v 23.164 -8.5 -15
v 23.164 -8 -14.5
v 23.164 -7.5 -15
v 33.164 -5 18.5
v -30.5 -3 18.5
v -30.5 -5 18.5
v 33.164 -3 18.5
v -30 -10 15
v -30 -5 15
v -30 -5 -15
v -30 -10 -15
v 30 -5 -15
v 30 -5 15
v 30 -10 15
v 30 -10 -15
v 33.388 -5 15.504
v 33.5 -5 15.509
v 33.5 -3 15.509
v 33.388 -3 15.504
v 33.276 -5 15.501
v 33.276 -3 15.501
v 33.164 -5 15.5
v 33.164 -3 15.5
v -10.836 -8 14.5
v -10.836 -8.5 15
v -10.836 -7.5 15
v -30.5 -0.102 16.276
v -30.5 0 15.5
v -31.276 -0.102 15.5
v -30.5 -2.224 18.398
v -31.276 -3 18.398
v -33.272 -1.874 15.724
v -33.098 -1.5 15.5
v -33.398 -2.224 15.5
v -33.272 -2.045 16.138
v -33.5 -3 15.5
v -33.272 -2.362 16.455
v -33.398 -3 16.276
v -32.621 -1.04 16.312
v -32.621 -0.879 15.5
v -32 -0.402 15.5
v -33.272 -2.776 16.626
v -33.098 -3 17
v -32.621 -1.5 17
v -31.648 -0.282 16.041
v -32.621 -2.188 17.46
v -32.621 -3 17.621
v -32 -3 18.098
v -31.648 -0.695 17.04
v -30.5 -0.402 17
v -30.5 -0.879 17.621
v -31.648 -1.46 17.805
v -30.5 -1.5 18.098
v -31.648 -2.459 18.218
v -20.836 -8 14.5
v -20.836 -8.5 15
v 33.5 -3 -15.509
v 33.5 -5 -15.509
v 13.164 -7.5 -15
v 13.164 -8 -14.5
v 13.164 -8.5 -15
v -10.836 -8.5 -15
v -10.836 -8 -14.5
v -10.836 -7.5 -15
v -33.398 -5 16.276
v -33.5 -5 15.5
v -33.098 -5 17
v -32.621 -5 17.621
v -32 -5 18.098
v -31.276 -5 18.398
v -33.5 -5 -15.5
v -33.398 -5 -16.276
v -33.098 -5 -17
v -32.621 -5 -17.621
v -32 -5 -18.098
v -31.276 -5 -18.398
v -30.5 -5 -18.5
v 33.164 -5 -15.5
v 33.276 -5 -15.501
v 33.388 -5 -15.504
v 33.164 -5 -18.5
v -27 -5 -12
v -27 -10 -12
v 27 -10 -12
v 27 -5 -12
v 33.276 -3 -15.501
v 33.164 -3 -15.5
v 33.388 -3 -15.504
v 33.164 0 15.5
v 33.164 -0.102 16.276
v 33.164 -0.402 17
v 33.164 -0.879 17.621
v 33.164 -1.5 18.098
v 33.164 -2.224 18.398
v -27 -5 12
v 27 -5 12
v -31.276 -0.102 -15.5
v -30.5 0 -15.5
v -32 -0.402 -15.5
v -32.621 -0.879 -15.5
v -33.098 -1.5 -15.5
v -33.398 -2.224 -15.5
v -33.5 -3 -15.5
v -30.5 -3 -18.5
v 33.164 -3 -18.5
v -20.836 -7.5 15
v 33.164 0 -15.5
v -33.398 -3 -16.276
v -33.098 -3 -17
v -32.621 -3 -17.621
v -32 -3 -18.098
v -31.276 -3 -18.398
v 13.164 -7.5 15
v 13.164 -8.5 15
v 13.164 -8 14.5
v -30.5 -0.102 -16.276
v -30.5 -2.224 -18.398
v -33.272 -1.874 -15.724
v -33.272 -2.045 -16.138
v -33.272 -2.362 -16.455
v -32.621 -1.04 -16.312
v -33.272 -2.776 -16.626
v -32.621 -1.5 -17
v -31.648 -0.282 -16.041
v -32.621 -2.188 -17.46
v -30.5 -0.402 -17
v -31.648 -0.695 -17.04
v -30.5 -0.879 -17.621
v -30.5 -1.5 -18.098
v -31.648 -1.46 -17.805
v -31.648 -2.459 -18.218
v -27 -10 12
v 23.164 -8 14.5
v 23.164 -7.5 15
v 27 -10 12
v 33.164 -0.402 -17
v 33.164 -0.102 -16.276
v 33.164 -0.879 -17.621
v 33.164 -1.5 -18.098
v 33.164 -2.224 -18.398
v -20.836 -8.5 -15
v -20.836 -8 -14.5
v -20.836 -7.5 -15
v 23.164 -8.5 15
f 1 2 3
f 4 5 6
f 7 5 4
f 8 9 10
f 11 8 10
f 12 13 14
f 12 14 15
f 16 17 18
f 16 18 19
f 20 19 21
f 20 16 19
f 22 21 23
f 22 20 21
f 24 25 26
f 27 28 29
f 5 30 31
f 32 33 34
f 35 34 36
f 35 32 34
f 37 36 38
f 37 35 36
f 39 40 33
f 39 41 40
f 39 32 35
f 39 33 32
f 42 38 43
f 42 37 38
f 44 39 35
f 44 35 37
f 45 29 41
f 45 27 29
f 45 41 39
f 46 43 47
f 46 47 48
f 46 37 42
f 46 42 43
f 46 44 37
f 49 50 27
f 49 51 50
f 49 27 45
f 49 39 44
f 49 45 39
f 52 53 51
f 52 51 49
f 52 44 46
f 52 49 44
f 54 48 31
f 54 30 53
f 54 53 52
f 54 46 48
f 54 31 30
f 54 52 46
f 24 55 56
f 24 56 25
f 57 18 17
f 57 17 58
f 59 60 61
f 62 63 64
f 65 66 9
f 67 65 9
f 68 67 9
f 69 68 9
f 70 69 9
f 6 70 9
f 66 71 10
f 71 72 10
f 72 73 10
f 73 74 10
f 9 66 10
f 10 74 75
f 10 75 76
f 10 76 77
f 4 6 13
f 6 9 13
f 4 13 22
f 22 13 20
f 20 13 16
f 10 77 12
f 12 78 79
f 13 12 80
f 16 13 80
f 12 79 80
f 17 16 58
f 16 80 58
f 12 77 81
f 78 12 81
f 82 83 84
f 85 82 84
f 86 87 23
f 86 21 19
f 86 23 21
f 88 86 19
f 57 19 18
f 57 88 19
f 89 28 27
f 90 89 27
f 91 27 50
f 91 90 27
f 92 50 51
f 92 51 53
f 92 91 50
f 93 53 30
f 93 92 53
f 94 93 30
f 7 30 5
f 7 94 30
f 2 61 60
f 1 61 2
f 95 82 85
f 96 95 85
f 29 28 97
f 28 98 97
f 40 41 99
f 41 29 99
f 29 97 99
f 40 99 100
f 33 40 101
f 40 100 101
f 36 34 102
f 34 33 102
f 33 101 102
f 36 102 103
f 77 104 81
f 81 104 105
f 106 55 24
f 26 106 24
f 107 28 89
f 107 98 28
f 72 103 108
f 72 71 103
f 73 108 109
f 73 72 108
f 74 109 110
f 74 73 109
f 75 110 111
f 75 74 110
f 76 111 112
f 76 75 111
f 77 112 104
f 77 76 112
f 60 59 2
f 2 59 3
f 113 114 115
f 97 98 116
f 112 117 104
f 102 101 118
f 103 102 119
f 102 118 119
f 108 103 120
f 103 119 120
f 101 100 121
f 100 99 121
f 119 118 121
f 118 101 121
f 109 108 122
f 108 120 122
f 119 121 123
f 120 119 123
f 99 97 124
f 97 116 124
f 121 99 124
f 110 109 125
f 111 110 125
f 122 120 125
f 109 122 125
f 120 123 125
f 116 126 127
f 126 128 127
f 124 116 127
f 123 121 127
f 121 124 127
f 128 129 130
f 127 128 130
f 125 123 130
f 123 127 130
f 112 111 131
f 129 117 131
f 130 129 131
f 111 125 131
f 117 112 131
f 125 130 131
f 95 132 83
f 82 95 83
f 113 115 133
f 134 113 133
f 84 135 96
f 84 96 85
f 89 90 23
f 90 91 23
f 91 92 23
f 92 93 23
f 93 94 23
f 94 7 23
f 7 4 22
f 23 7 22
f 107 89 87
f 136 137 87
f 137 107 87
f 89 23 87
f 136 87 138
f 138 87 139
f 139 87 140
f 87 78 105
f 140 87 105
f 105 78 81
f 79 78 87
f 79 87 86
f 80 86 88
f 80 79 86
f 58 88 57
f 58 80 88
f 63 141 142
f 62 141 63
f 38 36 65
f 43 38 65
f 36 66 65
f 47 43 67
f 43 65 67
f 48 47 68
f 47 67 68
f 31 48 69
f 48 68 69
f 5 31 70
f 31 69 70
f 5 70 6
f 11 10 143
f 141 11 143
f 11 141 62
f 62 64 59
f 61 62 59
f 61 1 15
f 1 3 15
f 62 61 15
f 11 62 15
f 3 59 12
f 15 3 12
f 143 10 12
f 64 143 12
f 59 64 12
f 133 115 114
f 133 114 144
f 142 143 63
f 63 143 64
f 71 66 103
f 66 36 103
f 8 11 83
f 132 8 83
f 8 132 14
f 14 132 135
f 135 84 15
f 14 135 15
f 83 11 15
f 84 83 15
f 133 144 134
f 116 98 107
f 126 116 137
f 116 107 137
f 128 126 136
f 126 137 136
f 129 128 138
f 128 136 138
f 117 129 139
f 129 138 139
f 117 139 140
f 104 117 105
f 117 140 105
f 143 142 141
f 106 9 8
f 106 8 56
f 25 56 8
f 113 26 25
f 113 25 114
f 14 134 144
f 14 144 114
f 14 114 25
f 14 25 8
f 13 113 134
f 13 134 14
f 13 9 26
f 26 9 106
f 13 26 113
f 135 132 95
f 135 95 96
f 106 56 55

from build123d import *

# Parameters (mm, degrees)
SKETCH1_W           = 67
SKETCH1_H           = 37
BOSS_EXTRUDE2_DEPTH = 5
SKETCH1_4_W         = 60
SKETCH1_4_H         = 30
BOSS_EXTRUDE3_DEPTH = 10
CUT_EXTRUDE1_START  = -10
SKETCH1_6_W         = 54
SKETCH1_6_H         = 24
CUT_EXTRUDE1_DEPTH  = 5
FILLET1_R           = 3
CAVITY1_START       = -3
CAVITY1_OUTLINE_W   = 0.336287878
CAVITY1_OUTLINE_H   = 40
CAVITY1_DEPTH       = 3
CAVITY1_START_2     = -5
CAVITY1_2_DEPTH     = 2
CAVITY1_START_3     = -16.617009358
CAVITY1_3_OUTLINE_W = 10
CAVITY1_3_OUTLINE_H = 2.403805922
CAVITY1_3_DEPTH     = 0.707106781
CAVITY1_START_4     = 4.596194078
CAVITY1_4_OUTLINE_W = 10
CAVITY1_4_OUTLINE_H = 2.090097423
CAVITY1_4_DEPTH     = 0.707106781


# Read off the part's stored shape, not the designer's step: Cavity1
with BuildPart() as part:
    # Sketch1 → Boss-Extrude2 (new body)
    with BuildSketch(Plane(origin=(0, 0, 0), x_dir=(1, 0, 0), z_dir=(0, 1, 0))):
        Rectangle(SKETCH1_W, SKETCH1_H)
    extrude(amount=-BOSS_EXTRUDE2_DEPTH)

    # Sketch1<4> → Boss-Extrude3 (add)
    with BuildSketch(Plane(origin=(0, 0, 0), x_dir=(1, 0, 0), z_dir=(0, 1, 0))):
        Rectangle(SKETCH1_4_W, SKETCH1_4_H)
    extrude(amount=-BOSS_EXTRUDE3_DEPTH)

    # Sketch1<6> → Cut-Extrude1 (cut)
    with BuildSketch(Plane(origin=(0, 0, 0), x_dir=(1, 0, 0), z_dir=(0, 1, 0)).offset(CUT_EXTRUDE1_START)):
        Rectangle(SKETCH1_6_W, SKETCH1_6_H)
    extrude(amount=CUT_EXTRUDE1_DEPTH, mode=Mode.SUBTRACT)

    # Fillet1
    fillet1_edges = [part.edges().sort_by_distance(p)[0] for p in [
        (0, 0, -18.5),
        (0, 0, 18.5),
        (-33.5, 0, 0),
        (-33.5, -2.5, -18.5),
        (-33.5, -2.5, 18.5),
    ]]
    fillet(fillet1_edges, radius=FILLET1_R)

    # Cavity1 outline → Cavity1 (cut)
    with BuildSketch(Plane(origin=(0, 0, 0), x_dir=(1, 0, 0), z_dir=(0, 1, 0)).offset(CAVITY1_START)):
        with Locations((33.331856061, 0)):
            Rectangle(CAVITY1_OUTLINE_W, CAVITY1_OUTLINE_H)
    extrude(amount=CAVITY1_DEPTH, mode=Mode.SUBTRACT)

    # Cavity1 2 outline → Cavity1 2 (cut)
    with BuildSketch(Plane(origin=(0, 0, 0), x_dir=(1, 0, 0), z_dir=(0, 1, 0)).offset(CAVITY1_START_2)):
        with BuildLine():
            Line((33.163712122, -15.5), (33.163712122, -20))
            Line((33.163712122, -20), (33.5, -20))
            Line((33.5, -20), (33.5, -15.509431541))
            ThreePointArc((33.5, -15.509431541), (33.331922177, -15.502358349), (33.163712122, -15.5))
        make_face()
        with BuildLine():
            Line((33.163712122, 20), (33.163712122, 15.5))
            ThreePointArc((33.163712122, 15.5), (33.331922177, 15.502358349), (33.5, 15.509431541))
            Line((33.5, 15.509431541), (33.5, 20))
            Line((33.5, 20), (33.163712122, 20))
        make_face()
    extrude(amount=CAVITY1_2_DEPTH, mode=Mode.SUBTRACT)

    # Cavity1 3 outline → Cavity1 3 (cut)
    with BuildSketch(Plane(origin=(0, 0, 0), x_dir=(1, 0, 0), z_dir=(0, 0.70710678118654, 0.707106781186555)).offset(CAVITY1_START_3)):
        with Locations((18.163712122, 5.798097039)):
            Rectangle(CAVITY1_3_OUTLINE_W, CAVITY1_3_OUTLINE_H)
        with Locations((-15.836287878, 5.798097039)):
            Rectangle(CAVITY1_3_OUTLINE_W, CAVITY1_3_OUTLINE_H)
    extrude(amount=CAVITY1_3_DEPTH, mode=Mode.SUBTRACT)

    # Cavity1 4 outline → Cavity1 4 (cut)
    with BuildSketch(Plane(origin=(0, 0, 0), x_dir=(1, 0, 0), z_dir=(0, 0.70710678118654, 0.707106781186555)).offset(CAVITY1_START_4)):
        with Locations((18.163712122, -16.954951288)):
            Rectangle(CAVITY1_4_OUTLINE_W, CAVITY1_4_OUTLINE_H)
        with Locations((-15.836287878, -16.954951288)):
            Rectangle(CAVITY1_4_OUTLINE_W, CAVITY1_4_OUTLINE_H)
    extrude(amount=CAVITY1_4_DEPTH, mode=Mode.SUBTRACT)


solid = part.part
